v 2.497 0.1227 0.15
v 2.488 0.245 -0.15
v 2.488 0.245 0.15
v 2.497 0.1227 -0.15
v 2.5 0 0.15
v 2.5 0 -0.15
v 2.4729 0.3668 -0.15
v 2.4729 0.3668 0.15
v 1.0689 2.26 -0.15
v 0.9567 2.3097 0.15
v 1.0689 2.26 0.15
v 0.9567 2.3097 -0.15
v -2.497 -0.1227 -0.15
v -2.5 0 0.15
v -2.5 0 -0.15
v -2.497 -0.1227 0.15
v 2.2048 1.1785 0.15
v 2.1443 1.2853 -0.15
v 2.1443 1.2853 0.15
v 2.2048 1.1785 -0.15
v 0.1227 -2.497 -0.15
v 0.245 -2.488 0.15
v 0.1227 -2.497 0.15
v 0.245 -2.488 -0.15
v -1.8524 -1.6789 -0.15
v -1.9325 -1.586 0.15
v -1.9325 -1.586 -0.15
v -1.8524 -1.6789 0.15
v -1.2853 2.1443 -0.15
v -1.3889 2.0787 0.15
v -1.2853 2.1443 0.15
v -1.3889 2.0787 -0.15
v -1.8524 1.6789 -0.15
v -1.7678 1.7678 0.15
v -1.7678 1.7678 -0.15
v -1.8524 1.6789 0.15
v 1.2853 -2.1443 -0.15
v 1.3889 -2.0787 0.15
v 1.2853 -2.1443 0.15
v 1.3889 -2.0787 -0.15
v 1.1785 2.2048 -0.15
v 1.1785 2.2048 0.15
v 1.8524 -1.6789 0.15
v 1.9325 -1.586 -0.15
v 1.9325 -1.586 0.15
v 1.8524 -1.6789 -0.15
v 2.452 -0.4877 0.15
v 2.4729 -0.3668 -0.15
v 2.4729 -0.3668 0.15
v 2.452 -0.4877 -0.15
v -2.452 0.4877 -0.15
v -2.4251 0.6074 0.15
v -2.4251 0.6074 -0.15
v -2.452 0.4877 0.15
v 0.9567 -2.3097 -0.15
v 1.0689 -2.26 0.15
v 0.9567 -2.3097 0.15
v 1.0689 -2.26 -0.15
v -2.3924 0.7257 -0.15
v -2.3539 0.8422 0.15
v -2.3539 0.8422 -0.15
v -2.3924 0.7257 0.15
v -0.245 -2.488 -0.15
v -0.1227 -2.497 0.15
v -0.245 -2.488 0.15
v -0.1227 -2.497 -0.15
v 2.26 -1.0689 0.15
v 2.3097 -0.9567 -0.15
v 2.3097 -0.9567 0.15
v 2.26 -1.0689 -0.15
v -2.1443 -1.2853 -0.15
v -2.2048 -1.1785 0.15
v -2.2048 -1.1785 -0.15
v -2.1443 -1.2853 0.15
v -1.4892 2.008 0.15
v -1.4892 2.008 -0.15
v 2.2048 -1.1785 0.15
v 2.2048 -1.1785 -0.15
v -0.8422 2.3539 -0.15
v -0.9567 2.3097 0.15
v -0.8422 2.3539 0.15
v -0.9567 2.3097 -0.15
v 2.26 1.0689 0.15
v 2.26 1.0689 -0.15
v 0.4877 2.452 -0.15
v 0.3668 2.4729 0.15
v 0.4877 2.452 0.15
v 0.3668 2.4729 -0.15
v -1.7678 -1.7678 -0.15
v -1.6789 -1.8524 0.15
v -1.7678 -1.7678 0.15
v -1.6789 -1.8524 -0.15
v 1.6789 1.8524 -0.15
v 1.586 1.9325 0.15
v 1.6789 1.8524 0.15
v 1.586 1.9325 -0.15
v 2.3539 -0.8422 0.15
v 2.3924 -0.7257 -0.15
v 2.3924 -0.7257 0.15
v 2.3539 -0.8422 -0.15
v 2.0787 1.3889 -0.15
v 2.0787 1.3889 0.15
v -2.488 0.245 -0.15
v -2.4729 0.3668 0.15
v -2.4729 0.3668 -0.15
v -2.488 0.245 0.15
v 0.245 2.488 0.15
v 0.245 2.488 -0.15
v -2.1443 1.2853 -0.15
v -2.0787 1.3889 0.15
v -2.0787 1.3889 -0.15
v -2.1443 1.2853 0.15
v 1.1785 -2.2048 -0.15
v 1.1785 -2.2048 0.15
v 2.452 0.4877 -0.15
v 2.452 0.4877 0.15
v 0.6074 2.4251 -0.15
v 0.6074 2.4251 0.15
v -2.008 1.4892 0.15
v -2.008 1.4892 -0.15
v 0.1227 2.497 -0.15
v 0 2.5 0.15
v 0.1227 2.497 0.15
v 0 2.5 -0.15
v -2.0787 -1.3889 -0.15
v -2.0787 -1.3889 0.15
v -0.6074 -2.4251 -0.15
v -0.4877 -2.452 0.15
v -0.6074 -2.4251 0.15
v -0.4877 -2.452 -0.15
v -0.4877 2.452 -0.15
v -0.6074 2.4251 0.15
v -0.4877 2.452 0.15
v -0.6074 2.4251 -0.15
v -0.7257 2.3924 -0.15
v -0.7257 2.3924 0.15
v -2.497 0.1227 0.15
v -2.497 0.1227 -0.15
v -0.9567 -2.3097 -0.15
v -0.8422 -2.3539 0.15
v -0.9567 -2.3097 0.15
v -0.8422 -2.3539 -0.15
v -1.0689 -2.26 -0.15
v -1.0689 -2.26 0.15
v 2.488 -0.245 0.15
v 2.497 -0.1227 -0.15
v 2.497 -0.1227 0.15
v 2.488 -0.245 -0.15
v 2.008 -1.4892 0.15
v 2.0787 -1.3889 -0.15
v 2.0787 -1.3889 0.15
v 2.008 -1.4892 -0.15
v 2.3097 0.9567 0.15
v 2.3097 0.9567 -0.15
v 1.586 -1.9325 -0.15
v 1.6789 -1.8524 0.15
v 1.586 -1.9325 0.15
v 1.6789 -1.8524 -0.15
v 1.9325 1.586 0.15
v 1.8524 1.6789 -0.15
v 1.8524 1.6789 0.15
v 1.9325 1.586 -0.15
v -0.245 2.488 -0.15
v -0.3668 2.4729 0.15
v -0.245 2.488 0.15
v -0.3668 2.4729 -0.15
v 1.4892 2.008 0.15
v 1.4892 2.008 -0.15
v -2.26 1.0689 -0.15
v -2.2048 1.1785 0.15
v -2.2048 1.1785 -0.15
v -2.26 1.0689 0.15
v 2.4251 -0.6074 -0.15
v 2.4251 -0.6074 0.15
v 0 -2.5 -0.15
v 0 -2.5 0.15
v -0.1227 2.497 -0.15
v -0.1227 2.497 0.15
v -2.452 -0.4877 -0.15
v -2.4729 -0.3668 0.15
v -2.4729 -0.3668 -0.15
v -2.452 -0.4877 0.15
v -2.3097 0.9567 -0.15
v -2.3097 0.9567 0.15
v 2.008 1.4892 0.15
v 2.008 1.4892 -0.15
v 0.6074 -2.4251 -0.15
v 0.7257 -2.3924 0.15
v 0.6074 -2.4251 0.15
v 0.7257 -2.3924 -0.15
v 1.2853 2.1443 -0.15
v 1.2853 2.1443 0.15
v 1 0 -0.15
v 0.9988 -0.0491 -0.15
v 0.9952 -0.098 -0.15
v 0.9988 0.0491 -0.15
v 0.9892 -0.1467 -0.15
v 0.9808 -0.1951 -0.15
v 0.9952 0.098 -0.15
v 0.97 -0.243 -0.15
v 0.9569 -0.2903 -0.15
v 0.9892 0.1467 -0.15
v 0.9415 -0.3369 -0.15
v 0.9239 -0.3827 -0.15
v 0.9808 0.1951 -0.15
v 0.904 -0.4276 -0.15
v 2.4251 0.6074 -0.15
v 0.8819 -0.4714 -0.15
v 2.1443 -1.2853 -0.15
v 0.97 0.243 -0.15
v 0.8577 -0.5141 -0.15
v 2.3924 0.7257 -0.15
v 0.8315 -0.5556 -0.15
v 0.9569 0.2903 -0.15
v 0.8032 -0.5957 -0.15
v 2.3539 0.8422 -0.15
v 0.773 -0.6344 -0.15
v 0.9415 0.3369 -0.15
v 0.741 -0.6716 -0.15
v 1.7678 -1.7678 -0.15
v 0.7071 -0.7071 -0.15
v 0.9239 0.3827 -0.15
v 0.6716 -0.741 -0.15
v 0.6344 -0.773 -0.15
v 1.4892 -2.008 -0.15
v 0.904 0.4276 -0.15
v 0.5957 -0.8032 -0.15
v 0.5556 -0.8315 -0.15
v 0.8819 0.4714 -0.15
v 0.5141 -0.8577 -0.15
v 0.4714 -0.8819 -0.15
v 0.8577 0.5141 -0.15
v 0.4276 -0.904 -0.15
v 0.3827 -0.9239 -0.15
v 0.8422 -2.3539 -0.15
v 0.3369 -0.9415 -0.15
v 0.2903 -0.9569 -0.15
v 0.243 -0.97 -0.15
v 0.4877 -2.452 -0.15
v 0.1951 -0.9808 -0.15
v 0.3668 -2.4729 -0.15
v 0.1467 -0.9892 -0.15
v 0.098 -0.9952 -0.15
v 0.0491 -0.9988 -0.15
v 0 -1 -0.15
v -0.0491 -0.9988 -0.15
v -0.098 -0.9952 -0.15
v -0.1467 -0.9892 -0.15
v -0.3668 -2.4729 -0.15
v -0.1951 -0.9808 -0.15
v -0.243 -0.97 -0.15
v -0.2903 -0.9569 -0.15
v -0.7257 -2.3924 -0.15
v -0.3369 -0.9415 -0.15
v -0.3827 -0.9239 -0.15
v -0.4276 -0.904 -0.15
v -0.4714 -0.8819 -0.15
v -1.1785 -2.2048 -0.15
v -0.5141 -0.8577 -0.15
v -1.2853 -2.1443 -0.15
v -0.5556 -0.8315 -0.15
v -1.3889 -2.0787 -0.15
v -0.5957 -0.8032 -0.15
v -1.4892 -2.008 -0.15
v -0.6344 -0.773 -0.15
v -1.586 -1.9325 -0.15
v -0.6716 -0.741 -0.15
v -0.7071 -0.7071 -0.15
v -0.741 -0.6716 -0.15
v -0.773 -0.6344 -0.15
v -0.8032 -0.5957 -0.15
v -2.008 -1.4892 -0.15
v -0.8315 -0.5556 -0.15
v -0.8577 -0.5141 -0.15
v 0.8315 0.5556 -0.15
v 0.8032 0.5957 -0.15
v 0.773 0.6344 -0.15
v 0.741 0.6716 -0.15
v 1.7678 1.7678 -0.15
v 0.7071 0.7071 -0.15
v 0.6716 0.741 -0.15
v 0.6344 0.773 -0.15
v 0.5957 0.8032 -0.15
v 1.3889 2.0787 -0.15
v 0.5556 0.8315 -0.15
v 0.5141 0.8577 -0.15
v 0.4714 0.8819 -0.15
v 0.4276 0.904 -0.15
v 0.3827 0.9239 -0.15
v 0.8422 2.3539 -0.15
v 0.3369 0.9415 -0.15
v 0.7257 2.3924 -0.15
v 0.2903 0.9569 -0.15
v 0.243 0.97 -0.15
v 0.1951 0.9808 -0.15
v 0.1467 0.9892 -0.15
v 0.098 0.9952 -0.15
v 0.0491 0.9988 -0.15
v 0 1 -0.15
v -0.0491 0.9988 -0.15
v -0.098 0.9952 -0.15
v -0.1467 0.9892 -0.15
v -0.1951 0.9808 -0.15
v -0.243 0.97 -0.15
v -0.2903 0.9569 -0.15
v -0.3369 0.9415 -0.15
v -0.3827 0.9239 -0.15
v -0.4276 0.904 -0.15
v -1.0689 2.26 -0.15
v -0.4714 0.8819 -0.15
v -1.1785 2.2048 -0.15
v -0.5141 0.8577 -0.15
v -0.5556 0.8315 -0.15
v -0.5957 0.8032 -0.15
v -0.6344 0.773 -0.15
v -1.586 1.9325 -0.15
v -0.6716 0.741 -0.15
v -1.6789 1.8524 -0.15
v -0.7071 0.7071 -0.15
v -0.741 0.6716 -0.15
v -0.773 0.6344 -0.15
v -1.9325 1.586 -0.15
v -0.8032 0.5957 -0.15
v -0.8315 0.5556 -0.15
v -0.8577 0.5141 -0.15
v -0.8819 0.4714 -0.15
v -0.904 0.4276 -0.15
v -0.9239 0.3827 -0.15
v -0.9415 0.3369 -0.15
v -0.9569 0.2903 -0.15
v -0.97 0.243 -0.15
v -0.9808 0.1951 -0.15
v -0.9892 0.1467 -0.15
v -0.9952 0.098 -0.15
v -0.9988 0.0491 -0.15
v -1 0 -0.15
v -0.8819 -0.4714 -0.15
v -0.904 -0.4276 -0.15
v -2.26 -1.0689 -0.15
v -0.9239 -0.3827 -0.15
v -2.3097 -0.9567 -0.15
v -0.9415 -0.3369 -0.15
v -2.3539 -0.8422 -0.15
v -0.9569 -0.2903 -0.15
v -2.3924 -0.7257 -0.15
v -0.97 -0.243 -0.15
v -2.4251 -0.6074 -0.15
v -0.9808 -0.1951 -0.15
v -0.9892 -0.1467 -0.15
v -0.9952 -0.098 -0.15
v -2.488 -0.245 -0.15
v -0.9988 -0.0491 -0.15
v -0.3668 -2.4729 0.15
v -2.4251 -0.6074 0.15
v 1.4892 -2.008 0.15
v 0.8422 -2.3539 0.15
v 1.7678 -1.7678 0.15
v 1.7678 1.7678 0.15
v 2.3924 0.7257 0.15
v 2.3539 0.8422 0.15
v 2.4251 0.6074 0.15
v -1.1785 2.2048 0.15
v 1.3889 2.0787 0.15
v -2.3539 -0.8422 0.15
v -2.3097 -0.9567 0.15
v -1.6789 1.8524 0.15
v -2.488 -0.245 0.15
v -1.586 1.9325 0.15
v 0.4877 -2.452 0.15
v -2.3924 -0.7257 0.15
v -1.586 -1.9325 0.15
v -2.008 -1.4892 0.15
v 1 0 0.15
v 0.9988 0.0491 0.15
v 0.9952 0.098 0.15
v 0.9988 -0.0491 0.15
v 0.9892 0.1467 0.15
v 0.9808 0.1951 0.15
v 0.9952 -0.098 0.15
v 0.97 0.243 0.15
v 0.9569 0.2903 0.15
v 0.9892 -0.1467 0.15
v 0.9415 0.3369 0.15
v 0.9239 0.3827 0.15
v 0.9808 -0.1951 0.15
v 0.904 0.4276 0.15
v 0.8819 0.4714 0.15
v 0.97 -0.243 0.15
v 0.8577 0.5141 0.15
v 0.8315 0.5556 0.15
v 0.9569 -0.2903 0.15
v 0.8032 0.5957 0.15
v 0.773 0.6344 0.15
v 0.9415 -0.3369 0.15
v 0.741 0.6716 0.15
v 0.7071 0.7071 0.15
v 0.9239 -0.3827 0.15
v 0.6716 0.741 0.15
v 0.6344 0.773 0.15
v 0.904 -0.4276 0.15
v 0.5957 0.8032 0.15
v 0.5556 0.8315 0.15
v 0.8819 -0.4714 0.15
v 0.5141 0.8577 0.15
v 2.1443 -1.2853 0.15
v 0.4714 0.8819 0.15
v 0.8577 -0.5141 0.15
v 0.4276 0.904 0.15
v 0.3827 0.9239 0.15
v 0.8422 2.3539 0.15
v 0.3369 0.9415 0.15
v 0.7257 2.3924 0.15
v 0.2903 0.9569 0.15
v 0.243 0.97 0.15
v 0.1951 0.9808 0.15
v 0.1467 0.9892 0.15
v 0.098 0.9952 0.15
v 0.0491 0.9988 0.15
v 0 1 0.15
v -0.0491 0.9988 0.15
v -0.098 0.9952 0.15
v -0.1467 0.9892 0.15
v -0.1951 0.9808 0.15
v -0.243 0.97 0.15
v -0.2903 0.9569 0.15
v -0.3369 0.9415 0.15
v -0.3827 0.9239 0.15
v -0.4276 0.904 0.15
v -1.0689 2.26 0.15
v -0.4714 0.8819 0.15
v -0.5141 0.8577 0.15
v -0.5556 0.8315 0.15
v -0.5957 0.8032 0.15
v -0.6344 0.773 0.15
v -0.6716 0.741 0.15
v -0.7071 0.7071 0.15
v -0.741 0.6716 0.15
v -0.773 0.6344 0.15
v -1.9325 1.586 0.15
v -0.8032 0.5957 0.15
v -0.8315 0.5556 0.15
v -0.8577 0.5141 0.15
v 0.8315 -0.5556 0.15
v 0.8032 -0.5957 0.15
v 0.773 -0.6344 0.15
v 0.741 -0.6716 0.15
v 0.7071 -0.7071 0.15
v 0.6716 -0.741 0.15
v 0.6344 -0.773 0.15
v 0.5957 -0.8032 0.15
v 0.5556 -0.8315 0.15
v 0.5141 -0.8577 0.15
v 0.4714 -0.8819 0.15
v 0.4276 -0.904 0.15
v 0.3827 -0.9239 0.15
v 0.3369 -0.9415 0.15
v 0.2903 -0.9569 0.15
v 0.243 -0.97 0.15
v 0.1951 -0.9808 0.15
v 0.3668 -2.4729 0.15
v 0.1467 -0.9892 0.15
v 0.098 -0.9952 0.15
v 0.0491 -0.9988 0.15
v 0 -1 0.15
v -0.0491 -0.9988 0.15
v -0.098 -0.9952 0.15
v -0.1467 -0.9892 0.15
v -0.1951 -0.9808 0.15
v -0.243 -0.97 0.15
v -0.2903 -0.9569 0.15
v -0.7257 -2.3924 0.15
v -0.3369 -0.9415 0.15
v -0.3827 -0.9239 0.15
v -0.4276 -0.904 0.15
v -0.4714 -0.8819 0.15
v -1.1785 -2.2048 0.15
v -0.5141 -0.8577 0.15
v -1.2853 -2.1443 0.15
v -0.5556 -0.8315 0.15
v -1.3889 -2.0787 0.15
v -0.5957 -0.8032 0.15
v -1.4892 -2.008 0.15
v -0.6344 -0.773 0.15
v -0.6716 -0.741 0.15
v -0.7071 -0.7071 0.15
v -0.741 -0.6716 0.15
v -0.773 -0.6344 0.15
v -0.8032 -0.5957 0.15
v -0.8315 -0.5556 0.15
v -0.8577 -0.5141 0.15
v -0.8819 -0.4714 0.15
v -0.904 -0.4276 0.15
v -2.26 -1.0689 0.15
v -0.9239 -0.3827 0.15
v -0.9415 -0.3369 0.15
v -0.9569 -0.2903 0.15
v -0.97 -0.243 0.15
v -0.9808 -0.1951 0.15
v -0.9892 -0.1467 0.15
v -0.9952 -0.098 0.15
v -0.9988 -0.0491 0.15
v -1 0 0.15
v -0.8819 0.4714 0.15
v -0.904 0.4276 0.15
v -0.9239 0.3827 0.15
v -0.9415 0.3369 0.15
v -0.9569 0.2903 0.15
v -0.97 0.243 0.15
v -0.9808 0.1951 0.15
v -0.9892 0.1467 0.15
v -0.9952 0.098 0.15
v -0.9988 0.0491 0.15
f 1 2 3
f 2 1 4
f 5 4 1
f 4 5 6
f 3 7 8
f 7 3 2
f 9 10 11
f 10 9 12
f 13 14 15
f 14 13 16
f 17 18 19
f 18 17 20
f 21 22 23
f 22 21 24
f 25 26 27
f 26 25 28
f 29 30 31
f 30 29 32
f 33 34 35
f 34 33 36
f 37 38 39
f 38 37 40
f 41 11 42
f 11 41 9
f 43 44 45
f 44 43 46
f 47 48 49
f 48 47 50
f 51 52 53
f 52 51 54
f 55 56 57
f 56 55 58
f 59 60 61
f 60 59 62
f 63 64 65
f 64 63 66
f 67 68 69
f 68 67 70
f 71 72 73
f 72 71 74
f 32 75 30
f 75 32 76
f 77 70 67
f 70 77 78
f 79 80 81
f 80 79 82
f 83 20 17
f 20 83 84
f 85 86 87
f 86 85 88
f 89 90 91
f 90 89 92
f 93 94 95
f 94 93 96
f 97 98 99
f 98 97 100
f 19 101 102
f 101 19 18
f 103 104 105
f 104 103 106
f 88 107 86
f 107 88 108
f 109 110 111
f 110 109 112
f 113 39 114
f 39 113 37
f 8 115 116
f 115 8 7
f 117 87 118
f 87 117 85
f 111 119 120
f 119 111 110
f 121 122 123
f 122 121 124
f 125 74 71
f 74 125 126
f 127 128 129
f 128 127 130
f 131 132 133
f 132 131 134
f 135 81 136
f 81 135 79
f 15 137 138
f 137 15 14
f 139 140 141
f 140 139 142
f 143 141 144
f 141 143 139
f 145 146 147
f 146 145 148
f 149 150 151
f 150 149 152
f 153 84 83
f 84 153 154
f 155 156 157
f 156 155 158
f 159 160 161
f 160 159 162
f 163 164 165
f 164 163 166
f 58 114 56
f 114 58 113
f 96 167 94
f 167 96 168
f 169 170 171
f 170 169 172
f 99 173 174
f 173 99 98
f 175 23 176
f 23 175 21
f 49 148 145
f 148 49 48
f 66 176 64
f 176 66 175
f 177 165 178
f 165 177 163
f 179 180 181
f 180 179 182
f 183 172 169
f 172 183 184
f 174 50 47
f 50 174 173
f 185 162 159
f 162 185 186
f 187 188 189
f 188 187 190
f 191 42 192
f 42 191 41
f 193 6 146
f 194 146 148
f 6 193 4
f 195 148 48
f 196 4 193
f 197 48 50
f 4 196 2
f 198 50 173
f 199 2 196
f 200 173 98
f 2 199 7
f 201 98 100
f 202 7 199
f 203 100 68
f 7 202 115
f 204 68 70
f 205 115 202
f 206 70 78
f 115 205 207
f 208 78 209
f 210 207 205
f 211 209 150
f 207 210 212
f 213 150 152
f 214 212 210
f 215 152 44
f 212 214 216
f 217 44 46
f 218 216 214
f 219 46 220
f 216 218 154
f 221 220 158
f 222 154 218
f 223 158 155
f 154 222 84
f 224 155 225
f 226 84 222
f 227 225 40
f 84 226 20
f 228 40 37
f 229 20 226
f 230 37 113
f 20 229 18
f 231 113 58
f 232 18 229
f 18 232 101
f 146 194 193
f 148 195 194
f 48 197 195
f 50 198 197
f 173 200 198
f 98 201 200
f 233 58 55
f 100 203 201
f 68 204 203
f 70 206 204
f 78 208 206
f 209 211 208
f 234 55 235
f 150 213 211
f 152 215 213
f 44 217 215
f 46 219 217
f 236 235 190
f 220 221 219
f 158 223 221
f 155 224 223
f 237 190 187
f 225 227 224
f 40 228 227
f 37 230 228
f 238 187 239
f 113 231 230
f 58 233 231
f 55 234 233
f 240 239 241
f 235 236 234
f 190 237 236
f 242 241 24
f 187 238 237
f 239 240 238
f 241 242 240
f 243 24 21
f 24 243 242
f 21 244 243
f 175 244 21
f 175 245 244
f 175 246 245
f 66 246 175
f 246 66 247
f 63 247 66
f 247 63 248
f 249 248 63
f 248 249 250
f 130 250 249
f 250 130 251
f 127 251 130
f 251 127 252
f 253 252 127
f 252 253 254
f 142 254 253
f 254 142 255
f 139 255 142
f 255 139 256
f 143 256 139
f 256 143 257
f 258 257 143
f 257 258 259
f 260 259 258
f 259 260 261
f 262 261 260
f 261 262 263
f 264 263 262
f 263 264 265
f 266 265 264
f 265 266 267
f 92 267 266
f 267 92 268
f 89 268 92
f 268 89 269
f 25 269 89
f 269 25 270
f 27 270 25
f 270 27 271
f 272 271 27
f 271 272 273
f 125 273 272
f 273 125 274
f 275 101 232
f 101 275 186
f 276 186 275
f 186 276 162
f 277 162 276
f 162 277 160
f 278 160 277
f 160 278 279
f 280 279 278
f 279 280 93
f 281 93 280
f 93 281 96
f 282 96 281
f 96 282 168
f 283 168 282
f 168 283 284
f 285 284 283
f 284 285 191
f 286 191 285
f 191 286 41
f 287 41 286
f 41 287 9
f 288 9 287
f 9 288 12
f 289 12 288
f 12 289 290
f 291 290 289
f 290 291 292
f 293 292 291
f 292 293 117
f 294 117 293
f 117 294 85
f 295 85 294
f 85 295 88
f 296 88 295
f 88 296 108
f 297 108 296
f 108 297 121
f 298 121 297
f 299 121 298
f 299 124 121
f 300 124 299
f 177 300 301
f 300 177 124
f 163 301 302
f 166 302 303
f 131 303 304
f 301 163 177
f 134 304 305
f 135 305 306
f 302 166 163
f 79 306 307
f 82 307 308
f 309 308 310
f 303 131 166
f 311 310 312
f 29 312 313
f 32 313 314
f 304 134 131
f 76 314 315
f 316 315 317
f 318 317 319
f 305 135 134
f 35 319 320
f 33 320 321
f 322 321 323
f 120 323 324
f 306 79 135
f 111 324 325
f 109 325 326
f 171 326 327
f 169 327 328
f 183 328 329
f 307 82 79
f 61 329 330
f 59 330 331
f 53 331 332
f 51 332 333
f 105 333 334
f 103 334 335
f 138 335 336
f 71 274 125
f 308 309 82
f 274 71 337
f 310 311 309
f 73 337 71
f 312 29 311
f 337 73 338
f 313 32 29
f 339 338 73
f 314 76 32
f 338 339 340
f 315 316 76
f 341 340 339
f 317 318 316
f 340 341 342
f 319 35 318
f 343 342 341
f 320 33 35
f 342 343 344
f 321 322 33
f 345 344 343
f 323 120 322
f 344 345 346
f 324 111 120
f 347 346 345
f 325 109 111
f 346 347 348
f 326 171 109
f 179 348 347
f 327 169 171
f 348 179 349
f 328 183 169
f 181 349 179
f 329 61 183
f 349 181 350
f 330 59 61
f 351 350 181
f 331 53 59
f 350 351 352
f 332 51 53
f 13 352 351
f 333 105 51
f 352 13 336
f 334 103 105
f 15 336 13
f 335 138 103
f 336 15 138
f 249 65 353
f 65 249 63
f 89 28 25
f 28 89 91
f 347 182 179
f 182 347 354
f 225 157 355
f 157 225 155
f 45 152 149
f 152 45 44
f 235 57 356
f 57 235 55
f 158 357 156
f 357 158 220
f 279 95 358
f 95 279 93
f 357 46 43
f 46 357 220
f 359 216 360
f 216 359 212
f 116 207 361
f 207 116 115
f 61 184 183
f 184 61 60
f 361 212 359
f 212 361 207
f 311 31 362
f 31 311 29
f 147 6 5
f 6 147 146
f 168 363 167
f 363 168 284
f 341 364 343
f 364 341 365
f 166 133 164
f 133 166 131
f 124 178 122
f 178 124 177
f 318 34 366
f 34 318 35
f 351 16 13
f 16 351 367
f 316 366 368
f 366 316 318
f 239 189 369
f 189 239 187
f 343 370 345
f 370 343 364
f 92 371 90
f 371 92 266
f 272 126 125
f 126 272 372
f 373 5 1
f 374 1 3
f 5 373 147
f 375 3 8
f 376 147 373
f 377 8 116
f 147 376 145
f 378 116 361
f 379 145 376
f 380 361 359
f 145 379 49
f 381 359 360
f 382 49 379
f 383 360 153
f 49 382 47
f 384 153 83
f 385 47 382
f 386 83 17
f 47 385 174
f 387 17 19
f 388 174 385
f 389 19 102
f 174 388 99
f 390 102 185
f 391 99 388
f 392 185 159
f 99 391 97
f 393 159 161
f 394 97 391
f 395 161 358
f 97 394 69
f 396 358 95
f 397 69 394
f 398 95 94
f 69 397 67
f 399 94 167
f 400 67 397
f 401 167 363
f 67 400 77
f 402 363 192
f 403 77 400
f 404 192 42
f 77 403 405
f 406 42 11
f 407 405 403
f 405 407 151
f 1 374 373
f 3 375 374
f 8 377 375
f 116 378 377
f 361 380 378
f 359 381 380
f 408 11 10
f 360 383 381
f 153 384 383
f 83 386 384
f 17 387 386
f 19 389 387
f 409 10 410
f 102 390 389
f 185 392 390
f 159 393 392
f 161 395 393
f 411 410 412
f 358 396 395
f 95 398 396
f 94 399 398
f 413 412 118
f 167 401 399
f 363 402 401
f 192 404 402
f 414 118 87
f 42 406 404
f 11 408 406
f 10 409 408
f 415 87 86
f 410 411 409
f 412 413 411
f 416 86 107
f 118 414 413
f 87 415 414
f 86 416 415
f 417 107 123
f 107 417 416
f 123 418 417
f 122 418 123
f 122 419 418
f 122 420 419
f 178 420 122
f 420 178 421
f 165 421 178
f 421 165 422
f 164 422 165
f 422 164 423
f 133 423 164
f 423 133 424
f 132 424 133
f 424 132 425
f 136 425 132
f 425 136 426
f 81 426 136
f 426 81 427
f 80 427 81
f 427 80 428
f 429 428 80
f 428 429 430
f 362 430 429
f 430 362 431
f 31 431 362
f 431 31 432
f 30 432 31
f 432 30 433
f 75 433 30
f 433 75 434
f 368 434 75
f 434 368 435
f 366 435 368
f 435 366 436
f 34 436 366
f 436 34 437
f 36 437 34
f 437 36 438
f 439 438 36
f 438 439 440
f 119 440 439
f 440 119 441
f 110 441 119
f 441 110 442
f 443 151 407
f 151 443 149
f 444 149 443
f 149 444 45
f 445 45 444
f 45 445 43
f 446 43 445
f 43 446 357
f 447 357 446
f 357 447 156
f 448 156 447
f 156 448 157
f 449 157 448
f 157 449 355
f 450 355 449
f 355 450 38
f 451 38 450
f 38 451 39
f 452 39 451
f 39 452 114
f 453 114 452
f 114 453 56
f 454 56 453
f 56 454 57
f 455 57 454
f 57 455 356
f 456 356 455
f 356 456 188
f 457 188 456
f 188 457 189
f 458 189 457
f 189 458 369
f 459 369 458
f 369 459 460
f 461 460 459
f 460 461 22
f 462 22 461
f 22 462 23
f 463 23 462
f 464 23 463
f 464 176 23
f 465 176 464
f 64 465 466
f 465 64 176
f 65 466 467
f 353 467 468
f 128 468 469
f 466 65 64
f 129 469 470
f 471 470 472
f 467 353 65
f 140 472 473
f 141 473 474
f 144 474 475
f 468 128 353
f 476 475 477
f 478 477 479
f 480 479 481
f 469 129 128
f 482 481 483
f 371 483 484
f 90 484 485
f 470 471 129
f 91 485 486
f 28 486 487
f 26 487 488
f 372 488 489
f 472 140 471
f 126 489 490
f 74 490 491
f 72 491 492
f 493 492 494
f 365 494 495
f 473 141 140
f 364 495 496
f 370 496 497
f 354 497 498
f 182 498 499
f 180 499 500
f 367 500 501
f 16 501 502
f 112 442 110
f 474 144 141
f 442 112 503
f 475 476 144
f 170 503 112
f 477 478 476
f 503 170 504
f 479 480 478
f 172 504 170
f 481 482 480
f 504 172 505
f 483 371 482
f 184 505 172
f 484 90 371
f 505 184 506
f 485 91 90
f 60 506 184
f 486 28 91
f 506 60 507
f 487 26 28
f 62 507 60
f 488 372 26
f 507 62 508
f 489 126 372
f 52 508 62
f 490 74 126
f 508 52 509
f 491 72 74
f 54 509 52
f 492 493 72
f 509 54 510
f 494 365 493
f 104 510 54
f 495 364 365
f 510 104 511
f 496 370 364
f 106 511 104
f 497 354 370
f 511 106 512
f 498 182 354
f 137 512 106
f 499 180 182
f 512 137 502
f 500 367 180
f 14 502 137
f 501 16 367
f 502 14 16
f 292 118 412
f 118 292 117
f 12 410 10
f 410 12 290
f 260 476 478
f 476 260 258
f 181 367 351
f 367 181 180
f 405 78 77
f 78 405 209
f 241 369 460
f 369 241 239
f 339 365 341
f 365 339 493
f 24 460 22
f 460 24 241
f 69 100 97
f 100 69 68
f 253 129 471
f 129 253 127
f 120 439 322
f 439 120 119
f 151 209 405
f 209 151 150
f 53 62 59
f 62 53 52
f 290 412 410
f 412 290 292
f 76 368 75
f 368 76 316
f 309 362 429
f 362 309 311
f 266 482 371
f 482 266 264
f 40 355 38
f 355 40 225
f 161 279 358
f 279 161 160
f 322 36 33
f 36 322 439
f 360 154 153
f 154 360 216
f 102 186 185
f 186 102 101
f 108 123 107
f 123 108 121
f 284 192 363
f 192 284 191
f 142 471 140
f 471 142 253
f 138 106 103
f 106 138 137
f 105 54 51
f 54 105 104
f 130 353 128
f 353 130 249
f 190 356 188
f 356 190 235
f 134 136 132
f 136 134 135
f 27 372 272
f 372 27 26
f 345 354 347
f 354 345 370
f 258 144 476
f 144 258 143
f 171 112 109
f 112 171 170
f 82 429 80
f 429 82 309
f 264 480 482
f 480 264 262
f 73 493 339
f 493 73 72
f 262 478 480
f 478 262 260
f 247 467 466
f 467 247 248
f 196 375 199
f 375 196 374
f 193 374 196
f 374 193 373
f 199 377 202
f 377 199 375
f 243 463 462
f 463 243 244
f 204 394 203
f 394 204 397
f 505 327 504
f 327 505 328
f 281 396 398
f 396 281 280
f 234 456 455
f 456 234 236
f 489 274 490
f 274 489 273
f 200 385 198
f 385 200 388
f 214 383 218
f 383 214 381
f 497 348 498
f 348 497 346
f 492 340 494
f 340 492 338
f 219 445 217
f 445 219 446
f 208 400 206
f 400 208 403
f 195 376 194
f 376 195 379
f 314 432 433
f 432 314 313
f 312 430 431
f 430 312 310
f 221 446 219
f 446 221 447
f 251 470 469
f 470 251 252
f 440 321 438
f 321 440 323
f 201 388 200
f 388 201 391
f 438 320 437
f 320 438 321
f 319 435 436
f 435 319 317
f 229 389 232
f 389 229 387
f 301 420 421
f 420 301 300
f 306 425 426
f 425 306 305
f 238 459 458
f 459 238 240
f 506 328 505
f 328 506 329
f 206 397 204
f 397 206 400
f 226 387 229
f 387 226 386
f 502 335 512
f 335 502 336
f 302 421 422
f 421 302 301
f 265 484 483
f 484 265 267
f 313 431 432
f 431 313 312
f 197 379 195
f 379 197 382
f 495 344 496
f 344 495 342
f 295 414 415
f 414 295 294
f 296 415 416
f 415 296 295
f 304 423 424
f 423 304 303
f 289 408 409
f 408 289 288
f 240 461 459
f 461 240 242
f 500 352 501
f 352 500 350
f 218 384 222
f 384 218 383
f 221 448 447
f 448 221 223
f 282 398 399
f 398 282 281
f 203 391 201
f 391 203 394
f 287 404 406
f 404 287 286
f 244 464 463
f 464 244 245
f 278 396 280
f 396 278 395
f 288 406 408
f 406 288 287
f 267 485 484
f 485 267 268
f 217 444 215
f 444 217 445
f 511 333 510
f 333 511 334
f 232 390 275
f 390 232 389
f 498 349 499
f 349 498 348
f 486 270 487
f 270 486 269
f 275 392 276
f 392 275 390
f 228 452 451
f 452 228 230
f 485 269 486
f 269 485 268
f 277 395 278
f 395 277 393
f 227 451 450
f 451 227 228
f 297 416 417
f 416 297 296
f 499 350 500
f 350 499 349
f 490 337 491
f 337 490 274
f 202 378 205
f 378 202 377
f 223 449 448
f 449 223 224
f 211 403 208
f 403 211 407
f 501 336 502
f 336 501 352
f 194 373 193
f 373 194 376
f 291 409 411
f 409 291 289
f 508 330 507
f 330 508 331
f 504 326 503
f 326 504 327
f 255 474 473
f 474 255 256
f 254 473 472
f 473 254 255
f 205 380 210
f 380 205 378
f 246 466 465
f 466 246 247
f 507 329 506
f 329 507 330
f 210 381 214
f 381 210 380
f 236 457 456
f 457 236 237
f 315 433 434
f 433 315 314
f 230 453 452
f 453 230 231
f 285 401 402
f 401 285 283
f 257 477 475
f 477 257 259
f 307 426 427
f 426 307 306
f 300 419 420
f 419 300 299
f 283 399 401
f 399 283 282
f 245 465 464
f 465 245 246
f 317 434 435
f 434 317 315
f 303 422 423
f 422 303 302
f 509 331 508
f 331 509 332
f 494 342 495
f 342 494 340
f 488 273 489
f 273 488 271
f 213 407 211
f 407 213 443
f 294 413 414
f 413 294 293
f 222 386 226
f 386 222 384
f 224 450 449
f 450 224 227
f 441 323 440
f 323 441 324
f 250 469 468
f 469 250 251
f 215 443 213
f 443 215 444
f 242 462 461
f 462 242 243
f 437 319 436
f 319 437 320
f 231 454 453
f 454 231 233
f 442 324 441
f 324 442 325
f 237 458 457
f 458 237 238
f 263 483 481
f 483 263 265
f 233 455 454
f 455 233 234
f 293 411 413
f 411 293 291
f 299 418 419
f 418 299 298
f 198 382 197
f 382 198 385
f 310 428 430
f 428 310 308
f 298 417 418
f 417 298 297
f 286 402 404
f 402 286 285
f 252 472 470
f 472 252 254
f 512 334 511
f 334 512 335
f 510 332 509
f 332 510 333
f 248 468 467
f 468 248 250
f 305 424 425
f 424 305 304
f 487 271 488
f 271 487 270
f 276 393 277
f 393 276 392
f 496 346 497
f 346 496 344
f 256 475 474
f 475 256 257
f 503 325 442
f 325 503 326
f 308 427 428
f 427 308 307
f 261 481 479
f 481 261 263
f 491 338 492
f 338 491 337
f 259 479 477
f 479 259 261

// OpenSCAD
// Flat washer: 2.0mm ID, 5.0mm OD, 0.3mm thickness

inner_diameter_mm = 2.0;
outer_diameter_mm = 5.0;
thickness_mm      = 0.3;

$fn = 128; // smooth circular profile

module washer(id, od, h) {
    difference() {
        cylinder(d=od, h=h, center=true);
        cylinder(d=id, h=h + 0.2, center=true); // slight extra to guarantee through-hole
    }
}

washer(inner_diameter_mm, outer_diameter_mm, thickness_mm);
